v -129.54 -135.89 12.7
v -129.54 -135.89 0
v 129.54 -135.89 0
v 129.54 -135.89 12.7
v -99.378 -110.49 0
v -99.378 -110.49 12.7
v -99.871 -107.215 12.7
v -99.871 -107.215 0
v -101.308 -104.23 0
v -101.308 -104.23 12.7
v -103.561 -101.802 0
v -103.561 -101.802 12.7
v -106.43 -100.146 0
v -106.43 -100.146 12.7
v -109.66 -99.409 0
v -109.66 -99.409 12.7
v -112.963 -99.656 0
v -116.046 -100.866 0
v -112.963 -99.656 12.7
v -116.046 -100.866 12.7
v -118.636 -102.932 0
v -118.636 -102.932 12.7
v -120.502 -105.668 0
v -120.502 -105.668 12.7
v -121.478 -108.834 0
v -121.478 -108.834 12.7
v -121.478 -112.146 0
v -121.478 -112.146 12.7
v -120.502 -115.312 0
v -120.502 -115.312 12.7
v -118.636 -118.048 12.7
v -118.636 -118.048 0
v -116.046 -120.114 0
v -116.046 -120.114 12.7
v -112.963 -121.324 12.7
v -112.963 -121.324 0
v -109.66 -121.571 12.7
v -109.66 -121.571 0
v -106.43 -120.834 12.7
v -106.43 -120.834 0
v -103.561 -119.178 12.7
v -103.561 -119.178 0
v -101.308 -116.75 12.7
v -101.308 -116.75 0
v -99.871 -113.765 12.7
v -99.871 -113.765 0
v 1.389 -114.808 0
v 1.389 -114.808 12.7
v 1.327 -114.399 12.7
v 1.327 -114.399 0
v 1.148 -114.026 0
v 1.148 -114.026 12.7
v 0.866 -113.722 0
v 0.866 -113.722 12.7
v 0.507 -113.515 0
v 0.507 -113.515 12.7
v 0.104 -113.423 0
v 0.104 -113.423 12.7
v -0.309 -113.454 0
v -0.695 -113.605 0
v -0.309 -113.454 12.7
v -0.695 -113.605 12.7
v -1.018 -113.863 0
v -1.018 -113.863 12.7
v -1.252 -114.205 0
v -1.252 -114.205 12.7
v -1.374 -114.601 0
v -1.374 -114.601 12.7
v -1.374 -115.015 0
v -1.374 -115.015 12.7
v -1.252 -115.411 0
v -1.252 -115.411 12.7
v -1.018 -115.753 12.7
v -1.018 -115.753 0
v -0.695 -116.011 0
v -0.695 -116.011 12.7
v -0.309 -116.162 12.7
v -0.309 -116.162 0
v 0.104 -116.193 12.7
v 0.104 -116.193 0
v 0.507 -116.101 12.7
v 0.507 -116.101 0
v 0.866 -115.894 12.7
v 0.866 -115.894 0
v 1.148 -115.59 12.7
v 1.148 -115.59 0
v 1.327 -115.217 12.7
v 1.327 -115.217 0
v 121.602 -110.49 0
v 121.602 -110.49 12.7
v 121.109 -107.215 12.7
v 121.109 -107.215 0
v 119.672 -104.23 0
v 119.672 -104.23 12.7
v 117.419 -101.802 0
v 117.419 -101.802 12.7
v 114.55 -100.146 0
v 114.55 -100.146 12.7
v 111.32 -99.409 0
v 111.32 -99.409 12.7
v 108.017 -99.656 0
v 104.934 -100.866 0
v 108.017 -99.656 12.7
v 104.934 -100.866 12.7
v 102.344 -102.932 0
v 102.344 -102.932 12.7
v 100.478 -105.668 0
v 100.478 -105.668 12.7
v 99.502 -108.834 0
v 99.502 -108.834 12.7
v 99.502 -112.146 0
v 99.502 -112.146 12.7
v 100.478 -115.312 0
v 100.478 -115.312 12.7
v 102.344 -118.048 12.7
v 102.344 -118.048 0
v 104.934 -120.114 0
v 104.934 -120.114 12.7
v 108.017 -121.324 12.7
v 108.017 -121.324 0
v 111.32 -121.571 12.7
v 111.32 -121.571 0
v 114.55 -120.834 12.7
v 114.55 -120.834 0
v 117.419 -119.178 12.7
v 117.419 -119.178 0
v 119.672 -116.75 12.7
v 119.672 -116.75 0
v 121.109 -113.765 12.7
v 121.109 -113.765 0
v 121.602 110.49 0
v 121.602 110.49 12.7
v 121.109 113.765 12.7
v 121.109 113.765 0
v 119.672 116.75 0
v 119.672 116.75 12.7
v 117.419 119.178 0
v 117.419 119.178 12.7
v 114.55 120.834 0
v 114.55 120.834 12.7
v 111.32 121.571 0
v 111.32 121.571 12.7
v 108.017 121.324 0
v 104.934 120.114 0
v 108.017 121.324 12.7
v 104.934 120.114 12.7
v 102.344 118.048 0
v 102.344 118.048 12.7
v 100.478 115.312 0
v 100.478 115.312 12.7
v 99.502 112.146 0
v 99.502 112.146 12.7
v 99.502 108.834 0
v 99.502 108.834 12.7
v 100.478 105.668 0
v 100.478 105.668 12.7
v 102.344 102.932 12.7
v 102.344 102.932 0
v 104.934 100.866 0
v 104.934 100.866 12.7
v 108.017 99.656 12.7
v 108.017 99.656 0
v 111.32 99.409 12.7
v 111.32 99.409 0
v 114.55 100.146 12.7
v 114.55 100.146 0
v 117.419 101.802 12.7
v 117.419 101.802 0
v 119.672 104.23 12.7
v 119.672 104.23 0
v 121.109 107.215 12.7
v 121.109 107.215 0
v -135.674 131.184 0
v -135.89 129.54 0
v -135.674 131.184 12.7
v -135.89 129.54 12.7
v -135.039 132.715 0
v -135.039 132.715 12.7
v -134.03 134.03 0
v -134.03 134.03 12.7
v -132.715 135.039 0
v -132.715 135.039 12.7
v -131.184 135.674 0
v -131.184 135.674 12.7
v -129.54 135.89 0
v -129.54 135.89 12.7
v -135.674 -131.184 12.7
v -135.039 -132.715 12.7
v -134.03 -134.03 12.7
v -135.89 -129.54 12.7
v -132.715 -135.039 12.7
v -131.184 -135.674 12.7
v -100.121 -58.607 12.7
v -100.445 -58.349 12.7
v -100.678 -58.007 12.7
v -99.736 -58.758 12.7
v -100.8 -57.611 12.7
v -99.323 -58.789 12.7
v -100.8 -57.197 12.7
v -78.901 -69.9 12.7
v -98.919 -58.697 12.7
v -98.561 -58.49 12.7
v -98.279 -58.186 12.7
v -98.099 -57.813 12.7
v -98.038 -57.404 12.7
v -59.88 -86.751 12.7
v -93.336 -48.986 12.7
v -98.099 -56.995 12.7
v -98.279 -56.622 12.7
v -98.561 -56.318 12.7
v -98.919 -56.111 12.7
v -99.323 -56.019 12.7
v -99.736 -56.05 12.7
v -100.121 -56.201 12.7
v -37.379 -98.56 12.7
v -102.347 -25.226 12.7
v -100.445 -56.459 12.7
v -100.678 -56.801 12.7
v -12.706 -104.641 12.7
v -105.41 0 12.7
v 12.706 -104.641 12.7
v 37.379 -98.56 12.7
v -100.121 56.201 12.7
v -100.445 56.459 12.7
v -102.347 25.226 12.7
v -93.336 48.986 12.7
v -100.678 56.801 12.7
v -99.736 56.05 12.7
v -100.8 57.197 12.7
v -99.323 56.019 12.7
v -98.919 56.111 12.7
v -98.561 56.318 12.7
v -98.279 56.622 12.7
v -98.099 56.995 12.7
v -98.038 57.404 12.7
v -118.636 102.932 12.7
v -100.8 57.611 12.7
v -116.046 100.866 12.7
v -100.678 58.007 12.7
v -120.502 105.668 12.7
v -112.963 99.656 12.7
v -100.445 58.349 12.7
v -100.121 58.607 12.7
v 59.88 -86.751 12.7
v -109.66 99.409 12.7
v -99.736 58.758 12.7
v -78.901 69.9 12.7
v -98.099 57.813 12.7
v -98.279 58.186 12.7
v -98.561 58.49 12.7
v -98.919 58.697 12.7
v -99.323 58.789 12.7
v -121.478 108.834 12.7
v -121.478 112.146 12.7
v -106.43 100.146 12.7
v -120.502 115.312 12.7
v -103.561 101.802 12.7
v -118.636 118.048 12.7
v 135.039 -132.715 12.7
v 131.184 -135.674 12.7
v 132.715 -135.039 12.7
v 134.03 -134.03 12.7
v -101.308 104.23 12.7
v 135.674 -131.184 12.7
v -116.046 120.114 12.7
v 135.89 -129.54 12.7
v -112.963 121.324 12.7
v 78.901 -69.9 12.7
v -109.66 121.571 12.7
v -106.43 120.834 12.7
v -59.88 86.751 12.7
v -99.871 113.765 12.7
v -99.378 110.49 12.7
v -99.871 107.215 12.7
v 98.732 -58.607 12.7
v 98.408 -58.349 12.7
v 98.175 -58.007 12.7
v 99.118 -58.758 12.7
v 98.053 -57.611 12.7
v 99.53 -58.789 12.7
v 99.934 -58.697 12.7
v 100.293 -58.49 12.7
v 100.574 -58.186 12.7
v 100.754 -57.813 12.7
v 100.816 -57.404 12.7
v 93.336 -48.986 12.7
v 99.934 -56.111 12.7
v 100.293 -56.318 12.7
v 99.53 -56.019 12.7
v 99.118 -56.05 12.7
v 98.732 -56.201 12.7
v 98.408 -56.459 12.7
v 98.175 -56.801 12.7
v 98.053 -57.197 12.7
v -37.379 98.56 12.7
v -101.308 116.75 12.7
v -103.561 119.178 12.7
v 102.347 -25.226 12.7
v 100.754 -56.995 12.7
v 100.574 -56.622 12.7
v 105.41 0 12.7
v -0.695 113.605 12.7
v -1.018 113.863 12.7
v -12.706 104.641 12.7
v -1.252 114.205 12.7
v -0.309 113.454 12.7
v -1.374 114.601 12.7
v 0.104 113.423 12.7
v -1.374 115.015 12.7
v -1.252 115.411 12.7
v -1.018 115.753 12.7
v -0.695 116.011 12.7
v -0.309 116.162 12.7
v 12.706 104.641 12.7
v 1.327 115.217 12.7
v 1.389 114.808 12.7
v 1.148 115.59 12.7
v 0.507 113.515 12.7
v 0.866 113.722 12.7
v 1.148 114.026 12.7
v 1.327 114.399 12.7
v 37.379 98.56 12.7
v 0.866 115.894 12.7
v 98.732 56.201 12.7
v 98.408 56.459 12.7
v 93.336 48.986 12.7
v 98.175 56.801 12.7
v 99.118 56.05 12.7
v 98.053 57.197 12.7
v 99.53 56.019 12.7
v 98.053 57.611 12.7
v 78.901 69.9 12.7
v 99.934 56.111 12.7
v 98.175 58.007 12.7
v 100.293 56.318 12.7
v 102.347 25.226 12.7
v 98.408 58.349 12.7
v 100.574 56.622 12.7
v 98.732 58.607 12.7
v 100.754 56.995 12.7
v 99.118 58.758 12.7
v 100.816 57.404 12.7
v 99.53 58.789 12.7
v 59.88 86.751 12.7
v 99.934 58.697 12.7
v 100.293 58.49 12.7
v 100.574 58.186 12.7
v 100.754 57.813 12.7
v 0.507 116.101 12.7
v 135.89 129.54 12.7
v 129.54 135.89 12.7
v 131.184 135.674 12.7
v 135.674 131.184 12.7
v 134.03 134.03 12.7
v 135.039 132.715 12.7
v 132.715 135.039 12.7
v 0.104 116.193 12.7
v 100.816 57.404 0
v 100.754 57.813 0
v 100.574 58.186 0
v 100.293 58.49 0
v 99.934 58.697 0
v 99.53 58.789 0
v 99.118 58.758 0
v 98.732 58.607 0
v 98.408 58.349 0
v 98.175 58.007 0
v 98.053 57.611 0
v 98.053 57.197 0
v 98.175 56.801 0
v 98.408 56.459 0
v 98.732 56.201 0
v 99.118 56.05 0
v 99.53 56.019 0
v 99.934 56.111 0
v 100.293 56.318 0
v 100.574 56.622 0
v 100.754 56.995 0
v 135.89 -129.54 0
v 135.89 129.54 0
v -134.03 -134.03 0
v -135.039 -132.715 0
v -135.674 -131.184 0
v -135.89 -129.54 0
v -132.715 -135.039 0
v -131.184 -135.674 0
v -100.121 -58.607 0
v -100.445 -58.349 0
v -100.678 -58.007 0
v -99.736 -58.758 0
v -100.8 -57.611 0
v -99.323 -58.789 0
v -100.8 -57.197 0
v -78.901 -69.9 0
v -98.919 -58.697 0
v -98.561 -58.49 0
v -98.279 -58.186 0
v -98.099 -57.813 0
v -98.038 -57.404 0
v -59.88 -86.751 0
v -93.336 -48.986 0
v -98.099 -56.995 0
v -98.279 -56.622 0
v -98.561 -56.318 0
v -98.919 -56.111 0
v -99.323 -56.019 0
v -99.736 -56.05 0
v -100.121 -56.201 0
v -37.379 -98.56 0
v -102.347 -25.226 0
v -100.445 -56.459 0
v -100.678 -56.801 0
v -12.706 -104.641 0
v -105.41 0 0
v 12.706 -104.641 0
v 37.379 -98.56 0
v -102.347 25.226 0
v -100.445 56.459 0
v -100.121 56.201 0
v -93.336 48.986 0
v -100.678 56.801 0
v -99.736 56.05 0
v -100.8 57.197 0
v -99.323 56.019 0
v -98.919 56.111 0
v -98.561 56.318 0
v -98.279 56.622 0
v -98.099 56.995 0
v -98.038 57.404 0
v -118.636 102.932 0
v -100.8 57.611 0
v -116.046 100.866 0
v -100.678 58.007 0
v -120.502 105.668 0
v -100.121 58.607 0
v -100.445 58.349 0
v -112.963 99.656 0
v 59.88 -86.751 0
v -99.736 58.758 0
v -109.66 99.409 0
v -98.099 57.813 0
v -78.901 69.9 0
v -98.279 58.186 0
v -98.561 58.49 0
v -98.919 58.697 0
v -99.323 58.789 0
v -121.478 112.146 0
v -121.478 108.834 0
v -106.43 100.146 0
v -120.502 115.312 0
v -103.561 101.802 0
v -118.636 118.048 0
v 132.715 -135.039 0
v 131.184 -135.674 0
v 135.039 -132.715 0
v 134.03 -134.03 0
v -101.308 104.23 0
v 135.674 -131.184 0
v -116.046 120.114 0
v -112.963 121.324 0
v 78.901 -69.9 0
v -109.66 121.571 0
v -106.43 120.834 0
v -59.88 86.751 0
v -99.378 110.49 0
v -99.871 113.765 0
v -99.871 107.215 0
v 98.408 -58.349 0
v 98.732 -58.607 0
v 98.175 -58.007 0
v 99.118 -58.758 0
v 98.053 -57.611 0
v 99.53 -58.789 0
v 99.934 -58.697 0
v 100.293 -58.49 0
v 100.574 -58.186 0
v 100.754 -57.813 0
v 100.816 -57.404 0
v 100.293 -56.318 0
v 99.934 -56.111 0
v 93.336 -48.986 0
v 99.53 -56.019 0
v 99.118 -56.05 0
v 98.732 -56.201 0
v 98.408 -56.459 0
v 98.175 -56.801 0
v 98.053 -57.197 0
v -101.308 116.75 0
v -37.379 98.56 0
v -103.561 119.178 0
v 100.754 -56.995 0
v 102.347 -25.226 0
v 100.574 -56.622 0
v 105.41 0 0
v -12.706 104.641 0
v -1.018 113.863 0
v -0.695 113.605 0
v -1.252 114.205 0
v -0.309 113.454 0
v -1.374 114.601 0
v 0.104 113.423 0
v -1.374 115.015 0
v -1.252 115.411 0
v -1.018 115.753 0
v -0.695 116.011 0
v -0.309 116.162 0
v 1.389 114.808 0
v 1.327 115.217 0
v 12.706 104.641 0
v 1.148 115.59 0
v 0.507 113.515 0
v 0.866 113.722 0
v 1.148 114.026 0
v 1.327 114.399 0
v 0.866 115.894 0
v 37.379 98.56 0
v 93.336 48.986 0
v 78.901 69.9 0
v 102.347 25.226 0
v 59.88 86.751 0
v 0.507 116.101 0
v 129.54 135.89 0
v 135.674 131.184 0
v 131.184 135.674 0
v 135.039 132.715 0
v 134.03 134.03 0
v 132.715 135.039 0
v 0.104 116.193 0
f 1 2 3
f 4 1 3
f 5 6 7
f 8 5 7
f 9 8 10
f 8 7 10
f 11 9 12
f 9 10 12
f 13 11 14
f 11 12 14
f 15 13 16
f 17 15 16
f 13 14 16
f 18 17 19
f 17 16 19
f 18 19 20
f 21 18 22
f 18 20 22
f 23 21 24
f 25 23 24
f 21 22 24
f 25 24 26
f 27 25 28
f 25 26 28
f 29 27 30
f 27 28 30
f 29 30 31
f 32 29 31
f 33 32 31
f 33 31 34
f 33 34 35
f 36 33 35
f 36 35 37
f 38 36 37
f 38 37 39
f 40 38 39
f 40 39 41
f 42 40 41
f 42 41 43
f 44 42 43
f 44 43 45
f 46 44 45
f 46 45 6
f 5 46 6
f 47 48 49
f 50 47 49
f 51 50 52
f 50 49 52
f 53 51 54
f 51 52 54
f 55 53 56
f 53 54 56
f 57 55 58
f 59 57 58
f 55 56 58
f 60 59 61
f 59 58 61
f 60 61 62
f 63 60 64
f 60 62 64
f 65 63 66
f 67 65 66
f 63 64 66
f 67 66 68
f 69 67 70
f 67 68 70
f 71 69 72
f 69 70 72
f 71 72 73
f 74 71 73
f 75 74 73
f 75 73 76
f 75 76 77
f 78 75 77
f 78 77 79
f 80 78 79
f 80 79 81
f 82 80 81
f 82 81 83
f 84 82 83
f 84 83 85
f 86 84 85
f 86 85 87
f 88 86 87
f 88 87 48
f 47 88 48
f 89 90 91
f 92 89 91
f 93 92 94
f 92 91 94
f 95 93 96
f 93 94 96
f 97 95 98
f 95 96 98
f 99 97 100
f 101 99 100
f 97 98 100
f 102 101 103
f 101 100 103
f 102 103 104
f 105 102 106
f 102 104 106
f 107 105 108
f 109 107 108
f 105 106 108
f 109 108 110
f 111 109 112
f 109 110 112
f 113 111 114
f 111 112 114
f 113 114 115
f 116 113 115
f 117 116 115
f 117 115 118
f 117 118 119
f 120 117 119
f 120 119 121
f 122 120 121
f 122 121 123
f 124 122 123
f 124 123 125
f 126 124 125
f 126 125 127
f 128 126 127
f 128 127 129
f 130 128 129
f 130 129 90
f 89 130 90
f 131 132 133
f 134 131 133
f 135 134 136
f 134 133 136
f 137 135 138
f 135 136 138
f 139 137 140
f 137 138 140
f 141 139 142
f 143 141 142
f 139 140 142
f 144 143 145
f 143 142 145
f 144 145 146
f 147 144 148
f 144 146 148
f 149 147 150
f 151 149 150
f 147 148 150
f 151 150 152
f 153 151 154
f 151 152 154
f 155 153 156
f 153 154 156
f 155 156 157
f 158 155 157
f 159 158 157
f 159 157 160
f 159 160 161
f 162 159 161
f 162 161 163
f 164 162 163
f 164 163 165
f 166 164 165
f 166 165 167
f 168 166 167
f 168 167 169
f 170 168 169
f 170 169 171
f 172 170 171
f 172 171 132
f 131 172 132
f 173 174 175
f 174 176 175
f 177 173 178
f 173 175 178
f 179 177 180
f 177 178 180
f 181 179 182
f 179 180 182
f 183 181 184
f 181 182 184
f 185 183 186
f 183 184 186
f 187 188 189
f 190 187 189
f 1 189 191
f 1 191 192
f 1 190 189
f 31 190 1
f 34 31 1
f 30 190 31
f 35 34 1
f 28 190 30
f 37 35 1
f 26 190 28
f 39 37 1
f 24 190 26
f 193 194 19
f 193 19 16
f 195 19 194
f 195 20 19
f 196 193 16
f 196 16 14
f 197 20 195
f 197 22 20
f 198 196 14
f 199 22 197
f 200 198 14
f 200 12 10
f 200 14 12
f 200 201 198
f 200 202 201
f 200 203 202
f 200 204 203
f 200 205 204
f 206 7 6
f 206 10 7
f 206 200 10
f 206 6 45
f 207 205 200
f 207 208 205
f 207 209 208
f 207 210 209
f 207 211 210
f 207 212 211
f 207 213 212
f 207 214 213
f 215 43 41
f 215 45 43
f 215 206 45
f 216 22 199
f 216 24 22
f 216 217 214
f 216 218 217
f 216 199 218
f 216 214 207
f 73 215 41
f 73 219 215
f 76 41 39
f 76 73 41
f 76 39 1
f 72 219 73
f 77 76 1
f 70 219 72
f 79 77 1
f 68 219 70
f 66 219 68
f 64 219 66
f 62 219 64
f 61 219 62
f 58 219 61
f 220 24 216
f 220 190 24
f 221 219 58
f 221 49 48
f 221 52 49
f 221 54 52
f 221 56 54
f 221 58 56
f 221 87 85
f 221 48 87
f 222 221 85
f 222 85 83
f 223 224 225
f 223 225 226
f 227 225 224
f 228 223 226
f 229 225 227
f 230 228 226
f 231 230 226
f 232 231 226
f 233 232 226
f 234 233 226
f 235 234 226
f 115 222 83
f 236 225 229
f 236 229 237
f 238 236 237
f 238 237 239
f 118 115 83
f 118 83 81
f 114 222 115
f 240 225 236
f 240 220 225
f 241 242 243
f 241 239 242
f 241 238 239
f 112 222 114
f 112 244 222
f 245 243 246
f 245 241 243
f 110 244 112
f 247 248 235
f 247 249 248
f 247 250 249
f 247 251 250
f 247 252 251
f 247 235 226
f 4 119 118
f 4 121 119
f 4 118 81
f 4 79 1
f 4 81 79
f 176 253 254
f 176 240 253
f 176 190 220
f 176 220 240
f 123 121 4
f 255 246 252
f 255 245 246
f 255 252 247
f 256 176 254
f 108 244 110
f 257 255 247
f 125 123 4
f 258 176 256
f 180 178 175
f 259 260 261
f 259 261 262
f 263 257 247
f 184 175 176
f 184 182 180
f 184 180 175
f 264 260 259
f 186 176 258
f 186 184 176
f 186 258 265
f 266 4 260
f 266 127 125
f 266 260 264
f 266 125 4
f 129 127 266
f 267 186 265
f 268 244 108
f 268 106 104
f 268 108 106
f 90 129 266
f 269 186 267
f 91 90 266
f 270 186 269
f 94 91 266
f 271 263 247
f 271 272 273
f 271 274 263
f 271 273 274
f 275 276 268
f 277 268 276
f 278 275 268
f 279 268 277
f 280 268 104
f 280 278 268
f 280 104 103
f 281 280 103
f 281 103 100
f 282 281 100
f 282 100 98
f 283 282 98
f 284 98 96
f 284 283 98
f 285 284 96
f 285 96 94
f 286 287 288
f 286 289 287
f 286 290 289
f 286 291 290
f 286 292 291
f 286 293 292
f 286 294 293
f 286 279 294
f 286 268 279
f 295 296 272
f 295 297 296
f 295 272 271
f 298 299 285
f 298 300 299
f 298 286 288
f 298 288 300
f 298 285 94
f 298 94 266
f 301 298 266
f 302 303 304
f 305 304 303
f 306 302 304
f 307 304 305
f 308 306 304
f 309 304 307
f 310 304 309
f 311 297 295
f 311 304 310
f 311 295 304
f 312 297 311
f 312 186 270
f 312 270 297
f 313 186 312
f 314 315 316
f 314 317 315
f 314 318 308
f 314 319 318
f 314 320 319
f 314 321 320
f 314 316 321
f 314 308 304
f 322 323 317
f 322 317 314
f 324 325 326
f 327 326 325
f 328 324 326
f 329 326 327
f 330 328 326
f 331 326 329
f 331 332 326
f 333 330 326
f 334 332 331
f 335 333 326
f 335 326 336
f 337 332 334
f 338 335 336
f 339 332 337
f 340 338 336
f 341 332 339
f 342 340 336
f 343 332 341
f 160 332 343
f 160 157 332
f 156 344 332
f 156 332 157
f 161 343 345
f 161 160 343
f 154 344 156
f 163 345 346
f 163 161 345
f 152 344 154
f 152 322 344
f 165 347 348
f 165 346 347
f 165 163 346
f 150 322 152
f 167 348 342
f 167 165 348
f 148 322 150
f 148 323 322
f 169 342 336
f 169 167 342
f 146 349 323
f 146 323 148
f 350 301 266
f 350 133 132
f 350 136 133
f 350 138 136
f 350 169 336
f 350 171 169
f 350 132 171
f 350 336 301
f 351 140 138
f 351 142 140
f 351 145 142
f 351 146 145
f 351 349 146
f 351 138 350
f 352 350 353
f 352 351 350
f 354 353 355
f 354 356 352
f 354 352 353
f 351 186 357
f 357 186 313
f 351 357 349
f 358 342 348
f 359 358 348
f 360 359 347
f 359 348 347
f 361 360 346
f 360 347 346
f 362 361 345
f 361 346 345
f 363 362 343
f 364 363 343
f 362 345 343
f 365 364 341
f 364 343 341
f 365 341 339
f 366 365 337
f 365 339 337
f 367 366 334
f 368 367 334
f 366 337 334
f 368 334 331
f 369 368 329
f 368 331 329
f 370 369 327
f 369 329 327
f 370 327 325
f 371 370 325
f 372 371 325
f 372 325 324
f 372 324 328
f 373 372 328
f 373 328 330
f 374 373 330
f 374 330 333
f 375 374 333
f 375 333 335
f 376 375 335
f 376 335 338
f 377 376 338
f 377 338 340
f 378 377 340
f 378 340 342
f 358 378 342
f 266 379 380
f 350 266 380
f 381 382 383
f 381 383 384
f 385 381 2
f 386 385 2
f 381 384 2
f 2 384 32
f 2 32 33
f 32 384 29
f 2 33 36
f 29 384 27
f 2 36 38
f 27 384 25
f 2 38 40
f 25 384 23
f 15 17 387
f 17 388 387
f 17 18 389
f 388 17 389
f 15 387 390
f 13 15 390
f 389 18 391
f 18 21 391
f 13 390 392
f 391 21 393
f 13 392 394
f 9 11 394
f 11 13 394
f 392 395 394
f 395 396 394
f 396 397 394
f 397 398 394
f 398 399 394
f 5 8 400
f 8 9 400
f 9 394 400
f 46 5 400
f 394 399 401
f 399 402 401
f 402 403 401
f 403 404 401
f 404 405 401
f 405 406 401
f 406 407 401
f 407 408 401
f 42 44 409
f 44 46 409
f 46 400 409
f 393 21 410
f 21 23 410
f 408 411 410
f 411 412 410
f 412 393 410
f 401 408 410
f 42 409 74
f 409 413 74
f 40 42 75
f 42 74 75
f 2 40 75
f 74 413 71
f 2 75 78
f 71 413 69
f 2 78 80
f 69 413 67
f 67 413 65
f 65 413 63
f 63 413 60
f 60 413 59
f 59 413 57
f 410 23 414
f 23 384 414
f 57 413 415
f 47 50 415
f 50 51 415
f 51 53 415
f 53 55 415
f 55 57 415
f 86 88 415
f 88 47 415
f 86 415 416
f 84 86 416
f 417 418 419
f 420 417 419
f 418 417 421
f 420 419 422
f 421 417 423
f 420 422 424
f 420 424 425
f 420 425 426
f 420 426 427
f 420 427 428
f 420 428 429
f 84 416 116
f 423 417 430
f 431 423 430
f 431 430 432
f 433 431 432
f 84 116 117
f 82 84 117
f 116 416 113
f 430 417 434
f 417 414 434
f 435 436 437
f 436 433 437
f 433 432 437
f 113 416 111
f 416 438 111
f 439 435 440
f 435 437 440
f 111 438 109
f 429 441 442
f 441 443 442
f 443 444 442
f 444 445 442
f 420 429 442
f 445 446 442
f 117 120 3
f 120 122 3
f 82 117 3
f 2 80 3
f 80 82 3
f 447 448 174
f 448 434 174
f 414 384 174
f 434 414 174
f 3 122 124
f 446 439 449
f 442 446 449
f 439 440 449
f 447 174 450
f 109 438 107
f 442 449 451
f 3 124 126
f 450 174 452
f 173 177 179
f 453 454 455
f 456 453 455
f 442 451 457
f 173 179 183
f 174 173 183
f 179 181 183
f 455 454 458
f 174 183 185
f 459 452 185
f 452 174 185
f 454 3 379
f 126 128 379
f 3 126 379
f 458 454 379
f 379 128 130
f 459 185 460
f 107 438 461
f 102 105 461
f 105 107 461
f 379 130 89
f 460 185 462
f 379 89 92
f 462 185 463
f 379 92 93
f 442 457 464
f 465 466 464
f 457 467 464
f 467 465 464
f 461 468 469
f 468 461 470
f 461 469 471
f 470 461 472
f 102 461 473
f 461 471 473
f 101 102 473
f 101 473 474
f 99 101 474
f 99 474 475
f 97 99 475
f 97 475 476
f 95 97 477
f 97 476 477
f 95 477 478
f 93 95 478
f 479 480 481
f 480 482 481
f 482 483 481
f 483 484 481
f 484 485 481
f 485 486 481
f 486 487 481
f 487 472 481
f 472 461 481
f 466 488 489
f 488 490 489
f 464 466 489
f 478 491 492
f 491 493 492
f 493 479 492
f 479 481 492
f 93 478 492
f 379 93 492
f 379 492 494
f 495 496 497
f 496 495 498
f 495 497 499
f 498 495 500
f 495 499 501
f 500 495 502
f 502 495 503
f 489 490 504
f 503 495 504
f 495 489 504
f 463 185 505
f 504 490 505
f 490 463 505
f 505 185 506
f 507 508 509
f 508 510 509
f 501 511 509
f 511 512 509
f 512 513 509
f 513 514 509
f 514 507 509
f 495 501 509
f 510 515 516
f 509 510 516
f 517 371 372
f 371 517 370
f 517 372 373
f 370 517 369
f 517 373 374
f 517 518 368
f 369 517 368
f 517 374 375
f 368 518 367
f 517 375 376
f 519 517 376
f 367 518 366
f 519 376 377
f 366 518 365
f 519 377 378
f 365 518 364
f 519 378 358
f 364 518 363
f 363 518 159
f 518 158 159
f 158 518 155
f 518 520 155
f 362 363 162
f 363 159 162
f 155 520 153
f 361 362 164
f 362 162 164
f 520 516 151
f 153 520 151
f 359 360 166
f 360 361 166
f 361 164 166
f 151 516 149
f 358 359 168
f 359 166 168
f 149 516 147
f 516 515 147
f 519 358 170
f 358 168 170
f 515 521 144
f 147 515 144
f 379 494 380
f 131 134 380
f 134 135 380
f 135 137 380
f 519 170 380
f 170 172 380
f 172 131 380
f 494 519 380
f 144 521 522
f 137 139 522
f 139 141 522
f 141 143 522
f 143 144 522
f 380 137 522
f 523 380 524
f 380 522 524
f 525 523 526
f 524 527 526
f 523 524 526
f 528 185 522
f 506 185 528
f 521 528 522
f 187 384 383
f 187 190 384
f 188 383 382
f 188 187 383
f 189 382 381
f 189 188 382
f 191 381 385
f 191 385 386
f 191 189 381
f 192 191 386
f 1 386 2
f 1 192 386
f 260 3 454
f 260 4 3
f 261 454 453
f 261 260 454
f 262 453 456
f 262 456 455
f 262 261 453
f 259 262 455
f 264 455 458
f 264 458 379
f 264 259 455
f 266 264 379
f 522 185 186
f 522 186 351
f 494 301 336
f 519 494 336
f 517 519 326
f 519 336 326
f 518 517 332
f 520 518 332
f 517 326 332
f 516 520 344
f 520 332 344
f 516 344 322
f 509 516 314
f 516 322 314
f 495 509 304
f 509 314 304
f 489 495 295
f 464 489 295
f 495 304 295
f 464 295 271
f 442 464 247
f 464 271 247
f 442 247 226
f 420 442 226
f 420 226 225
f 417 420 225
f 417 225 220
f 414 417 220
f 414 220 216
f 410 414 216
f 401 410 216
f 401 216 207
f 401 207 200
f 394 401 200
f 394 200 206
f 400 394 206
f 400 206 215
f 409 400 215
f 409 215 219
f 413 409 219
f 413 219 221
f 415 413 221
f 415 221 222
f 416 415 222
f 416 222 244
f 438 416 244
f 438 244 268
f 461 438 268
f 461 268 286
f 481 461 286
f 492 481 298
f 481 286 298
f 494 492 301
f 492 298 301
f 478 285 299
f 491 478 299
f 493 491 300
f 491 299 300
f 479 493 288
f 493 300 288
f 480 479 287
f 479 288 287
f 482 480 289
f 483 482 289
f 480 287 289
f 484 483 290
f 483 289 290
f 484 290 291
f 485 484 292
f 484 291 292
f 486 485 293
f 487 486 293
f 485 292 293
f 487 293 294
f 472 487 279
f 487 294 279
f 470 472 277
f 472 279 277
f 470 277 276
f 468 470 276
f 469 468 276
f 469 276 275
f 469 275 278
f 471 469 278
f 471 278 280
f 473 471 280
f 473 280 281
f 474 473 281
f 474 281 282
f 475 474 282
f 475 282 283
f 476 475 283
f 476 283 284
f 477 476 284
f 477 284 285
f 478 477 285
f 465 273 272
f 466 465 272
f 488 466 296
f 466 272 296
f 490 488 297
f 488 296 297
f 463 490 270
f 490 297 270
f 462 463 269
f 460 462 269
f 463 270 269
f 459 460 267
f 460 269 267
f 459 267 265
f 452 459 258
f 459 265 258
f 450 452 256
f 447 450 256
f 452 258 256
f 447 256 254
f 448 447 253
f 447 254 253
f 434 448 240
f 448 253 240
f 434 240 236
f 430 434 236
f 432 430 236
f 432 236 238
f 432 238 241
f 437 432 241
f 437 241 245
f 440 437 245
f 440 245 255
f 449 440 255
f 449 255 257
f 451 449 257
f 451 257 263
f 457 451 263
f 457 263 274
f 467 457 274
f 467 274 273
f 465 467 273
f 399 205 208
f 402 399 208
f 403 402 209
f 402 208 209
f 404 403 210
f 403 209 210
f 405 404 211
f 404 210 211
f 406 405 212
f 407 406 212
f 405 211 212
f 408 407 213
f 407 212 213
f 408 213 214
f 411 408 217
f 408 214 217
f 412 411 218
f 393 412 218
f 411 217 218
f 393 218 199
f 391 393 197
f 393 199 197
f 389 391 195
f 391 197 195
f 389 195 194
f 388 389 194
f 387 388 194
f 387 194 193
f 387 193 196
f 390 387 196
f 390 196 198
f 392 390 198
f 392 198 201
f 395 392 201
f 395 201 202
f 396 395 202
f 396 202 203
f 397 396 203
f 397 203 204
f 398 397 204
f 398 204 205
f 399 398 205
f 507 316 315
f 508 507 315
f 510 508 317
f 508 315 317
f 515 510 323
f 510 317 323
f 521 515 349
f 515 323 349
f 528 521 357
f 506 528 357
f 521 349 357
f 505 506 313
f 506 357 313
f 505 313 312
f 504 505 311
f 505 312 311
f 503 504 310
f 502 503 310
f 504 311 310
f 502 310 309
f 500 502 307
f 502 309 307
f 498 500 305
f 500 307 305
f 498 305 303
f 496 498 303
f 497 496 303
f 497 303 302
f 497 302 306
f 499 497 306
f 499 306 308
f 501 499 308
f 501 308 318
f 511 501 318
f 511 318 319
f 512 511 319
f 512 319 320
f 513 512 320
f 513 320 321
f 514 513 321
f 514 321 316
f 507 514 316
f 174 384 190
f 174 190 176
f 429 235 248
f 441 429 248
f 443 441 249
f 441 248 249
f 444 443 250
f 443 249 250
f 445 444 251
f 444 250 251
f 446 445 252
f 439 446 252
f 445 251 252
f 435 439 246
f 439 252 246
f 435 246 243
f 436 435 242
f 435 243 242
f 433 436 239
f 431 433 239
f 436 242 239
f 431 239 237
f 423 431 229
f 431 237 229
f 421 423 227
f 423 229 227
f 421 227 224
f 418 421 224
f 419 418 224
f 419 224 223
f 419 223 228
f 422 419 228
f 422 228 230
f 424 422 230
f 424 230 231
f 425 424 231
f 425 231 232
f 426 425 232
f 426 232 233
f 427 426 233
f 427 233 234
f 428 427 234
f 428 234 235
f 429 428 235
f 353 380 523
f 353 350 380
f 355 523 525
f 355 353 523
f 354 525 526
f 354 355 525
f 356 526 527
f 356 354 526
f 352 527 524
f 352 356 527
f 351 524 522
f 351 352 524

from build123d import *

# Parameters (mm, degrees)
F0_W     = 271.78
F0_H     = 271.78
F1_DEPTH = 12.7
F2_R     = 6.35
F3_R     = 105.41
F4_DEPTH = 25.4
F5_R     = 1.389063
F6_DEPTH = 25.4
F7_R     = 11.1125
F8_DEPTH = 25.4


with BuildPart() as f1:
    # F0 (on Top) → F1 (new body)
    with BuildSketch(Plane.XY):
        Rectangle(F0_W, F0_H)
    extrude(amount=F1_DEPTH)

    # F2
    f2_edges = [f1.edges().sort_by_distance(p)[0] for p in [
        (-135.89, -135.89, 6.35),
        (135.89, -135.89, 6.35),
        (-135.89, 135.89, 6.35),
        (135.89, 135.89, 6.35),
    ]]
    fillet(f2_edges, radius=F2_R)

    # F3 (on face) → F4 (cut)
    with BuildSketch(Plane.XY.offset(12.7)):
        Circle(F3_R)
    extrude(amount=-F4_DEPTH, mode=Mode.SUBTRACT)

    # F5 (on face) → F6 (cut)
    with BuildSketch(Plane.XY.offset(12.7)):
        with Locations((0, 114.808)):
            Circle(F5_R)
        with Locations((99.426645, 57.404)):
            Circle(F5_R)
        with Locations((99.426645, -57.404)):
            Circle(F5_R)
        with Locations((0, -114.808)):
            Circle(F5_R)
        with Locations((-99.426645, -57.404)):
            Circle(F5_R)
        with Locations((-99.426645, 57.404)):
            Circle(F5_R)
    extrude(amount=-F6_DEPTH, mode=Mode.SUBTRACT)

    # F7 (on face) → F8 (cut)
    with BuildSketch(Plane.XY.offset(12.7)):
        with Locations((-110.49, 110.49)):
            Circle(F7_R)
        with Locations((110.49, 110.49)):
            Circle(F7_R)
        with Locations((110.49, -110.49)):
            Circle(F7_R)
        with Locations((-110.49, -110.49)):
            Circle(F7_R)
    extrude(amount=-F8_DEPTH, mode=Mode.SUBTRACT)


solid = f1.part
